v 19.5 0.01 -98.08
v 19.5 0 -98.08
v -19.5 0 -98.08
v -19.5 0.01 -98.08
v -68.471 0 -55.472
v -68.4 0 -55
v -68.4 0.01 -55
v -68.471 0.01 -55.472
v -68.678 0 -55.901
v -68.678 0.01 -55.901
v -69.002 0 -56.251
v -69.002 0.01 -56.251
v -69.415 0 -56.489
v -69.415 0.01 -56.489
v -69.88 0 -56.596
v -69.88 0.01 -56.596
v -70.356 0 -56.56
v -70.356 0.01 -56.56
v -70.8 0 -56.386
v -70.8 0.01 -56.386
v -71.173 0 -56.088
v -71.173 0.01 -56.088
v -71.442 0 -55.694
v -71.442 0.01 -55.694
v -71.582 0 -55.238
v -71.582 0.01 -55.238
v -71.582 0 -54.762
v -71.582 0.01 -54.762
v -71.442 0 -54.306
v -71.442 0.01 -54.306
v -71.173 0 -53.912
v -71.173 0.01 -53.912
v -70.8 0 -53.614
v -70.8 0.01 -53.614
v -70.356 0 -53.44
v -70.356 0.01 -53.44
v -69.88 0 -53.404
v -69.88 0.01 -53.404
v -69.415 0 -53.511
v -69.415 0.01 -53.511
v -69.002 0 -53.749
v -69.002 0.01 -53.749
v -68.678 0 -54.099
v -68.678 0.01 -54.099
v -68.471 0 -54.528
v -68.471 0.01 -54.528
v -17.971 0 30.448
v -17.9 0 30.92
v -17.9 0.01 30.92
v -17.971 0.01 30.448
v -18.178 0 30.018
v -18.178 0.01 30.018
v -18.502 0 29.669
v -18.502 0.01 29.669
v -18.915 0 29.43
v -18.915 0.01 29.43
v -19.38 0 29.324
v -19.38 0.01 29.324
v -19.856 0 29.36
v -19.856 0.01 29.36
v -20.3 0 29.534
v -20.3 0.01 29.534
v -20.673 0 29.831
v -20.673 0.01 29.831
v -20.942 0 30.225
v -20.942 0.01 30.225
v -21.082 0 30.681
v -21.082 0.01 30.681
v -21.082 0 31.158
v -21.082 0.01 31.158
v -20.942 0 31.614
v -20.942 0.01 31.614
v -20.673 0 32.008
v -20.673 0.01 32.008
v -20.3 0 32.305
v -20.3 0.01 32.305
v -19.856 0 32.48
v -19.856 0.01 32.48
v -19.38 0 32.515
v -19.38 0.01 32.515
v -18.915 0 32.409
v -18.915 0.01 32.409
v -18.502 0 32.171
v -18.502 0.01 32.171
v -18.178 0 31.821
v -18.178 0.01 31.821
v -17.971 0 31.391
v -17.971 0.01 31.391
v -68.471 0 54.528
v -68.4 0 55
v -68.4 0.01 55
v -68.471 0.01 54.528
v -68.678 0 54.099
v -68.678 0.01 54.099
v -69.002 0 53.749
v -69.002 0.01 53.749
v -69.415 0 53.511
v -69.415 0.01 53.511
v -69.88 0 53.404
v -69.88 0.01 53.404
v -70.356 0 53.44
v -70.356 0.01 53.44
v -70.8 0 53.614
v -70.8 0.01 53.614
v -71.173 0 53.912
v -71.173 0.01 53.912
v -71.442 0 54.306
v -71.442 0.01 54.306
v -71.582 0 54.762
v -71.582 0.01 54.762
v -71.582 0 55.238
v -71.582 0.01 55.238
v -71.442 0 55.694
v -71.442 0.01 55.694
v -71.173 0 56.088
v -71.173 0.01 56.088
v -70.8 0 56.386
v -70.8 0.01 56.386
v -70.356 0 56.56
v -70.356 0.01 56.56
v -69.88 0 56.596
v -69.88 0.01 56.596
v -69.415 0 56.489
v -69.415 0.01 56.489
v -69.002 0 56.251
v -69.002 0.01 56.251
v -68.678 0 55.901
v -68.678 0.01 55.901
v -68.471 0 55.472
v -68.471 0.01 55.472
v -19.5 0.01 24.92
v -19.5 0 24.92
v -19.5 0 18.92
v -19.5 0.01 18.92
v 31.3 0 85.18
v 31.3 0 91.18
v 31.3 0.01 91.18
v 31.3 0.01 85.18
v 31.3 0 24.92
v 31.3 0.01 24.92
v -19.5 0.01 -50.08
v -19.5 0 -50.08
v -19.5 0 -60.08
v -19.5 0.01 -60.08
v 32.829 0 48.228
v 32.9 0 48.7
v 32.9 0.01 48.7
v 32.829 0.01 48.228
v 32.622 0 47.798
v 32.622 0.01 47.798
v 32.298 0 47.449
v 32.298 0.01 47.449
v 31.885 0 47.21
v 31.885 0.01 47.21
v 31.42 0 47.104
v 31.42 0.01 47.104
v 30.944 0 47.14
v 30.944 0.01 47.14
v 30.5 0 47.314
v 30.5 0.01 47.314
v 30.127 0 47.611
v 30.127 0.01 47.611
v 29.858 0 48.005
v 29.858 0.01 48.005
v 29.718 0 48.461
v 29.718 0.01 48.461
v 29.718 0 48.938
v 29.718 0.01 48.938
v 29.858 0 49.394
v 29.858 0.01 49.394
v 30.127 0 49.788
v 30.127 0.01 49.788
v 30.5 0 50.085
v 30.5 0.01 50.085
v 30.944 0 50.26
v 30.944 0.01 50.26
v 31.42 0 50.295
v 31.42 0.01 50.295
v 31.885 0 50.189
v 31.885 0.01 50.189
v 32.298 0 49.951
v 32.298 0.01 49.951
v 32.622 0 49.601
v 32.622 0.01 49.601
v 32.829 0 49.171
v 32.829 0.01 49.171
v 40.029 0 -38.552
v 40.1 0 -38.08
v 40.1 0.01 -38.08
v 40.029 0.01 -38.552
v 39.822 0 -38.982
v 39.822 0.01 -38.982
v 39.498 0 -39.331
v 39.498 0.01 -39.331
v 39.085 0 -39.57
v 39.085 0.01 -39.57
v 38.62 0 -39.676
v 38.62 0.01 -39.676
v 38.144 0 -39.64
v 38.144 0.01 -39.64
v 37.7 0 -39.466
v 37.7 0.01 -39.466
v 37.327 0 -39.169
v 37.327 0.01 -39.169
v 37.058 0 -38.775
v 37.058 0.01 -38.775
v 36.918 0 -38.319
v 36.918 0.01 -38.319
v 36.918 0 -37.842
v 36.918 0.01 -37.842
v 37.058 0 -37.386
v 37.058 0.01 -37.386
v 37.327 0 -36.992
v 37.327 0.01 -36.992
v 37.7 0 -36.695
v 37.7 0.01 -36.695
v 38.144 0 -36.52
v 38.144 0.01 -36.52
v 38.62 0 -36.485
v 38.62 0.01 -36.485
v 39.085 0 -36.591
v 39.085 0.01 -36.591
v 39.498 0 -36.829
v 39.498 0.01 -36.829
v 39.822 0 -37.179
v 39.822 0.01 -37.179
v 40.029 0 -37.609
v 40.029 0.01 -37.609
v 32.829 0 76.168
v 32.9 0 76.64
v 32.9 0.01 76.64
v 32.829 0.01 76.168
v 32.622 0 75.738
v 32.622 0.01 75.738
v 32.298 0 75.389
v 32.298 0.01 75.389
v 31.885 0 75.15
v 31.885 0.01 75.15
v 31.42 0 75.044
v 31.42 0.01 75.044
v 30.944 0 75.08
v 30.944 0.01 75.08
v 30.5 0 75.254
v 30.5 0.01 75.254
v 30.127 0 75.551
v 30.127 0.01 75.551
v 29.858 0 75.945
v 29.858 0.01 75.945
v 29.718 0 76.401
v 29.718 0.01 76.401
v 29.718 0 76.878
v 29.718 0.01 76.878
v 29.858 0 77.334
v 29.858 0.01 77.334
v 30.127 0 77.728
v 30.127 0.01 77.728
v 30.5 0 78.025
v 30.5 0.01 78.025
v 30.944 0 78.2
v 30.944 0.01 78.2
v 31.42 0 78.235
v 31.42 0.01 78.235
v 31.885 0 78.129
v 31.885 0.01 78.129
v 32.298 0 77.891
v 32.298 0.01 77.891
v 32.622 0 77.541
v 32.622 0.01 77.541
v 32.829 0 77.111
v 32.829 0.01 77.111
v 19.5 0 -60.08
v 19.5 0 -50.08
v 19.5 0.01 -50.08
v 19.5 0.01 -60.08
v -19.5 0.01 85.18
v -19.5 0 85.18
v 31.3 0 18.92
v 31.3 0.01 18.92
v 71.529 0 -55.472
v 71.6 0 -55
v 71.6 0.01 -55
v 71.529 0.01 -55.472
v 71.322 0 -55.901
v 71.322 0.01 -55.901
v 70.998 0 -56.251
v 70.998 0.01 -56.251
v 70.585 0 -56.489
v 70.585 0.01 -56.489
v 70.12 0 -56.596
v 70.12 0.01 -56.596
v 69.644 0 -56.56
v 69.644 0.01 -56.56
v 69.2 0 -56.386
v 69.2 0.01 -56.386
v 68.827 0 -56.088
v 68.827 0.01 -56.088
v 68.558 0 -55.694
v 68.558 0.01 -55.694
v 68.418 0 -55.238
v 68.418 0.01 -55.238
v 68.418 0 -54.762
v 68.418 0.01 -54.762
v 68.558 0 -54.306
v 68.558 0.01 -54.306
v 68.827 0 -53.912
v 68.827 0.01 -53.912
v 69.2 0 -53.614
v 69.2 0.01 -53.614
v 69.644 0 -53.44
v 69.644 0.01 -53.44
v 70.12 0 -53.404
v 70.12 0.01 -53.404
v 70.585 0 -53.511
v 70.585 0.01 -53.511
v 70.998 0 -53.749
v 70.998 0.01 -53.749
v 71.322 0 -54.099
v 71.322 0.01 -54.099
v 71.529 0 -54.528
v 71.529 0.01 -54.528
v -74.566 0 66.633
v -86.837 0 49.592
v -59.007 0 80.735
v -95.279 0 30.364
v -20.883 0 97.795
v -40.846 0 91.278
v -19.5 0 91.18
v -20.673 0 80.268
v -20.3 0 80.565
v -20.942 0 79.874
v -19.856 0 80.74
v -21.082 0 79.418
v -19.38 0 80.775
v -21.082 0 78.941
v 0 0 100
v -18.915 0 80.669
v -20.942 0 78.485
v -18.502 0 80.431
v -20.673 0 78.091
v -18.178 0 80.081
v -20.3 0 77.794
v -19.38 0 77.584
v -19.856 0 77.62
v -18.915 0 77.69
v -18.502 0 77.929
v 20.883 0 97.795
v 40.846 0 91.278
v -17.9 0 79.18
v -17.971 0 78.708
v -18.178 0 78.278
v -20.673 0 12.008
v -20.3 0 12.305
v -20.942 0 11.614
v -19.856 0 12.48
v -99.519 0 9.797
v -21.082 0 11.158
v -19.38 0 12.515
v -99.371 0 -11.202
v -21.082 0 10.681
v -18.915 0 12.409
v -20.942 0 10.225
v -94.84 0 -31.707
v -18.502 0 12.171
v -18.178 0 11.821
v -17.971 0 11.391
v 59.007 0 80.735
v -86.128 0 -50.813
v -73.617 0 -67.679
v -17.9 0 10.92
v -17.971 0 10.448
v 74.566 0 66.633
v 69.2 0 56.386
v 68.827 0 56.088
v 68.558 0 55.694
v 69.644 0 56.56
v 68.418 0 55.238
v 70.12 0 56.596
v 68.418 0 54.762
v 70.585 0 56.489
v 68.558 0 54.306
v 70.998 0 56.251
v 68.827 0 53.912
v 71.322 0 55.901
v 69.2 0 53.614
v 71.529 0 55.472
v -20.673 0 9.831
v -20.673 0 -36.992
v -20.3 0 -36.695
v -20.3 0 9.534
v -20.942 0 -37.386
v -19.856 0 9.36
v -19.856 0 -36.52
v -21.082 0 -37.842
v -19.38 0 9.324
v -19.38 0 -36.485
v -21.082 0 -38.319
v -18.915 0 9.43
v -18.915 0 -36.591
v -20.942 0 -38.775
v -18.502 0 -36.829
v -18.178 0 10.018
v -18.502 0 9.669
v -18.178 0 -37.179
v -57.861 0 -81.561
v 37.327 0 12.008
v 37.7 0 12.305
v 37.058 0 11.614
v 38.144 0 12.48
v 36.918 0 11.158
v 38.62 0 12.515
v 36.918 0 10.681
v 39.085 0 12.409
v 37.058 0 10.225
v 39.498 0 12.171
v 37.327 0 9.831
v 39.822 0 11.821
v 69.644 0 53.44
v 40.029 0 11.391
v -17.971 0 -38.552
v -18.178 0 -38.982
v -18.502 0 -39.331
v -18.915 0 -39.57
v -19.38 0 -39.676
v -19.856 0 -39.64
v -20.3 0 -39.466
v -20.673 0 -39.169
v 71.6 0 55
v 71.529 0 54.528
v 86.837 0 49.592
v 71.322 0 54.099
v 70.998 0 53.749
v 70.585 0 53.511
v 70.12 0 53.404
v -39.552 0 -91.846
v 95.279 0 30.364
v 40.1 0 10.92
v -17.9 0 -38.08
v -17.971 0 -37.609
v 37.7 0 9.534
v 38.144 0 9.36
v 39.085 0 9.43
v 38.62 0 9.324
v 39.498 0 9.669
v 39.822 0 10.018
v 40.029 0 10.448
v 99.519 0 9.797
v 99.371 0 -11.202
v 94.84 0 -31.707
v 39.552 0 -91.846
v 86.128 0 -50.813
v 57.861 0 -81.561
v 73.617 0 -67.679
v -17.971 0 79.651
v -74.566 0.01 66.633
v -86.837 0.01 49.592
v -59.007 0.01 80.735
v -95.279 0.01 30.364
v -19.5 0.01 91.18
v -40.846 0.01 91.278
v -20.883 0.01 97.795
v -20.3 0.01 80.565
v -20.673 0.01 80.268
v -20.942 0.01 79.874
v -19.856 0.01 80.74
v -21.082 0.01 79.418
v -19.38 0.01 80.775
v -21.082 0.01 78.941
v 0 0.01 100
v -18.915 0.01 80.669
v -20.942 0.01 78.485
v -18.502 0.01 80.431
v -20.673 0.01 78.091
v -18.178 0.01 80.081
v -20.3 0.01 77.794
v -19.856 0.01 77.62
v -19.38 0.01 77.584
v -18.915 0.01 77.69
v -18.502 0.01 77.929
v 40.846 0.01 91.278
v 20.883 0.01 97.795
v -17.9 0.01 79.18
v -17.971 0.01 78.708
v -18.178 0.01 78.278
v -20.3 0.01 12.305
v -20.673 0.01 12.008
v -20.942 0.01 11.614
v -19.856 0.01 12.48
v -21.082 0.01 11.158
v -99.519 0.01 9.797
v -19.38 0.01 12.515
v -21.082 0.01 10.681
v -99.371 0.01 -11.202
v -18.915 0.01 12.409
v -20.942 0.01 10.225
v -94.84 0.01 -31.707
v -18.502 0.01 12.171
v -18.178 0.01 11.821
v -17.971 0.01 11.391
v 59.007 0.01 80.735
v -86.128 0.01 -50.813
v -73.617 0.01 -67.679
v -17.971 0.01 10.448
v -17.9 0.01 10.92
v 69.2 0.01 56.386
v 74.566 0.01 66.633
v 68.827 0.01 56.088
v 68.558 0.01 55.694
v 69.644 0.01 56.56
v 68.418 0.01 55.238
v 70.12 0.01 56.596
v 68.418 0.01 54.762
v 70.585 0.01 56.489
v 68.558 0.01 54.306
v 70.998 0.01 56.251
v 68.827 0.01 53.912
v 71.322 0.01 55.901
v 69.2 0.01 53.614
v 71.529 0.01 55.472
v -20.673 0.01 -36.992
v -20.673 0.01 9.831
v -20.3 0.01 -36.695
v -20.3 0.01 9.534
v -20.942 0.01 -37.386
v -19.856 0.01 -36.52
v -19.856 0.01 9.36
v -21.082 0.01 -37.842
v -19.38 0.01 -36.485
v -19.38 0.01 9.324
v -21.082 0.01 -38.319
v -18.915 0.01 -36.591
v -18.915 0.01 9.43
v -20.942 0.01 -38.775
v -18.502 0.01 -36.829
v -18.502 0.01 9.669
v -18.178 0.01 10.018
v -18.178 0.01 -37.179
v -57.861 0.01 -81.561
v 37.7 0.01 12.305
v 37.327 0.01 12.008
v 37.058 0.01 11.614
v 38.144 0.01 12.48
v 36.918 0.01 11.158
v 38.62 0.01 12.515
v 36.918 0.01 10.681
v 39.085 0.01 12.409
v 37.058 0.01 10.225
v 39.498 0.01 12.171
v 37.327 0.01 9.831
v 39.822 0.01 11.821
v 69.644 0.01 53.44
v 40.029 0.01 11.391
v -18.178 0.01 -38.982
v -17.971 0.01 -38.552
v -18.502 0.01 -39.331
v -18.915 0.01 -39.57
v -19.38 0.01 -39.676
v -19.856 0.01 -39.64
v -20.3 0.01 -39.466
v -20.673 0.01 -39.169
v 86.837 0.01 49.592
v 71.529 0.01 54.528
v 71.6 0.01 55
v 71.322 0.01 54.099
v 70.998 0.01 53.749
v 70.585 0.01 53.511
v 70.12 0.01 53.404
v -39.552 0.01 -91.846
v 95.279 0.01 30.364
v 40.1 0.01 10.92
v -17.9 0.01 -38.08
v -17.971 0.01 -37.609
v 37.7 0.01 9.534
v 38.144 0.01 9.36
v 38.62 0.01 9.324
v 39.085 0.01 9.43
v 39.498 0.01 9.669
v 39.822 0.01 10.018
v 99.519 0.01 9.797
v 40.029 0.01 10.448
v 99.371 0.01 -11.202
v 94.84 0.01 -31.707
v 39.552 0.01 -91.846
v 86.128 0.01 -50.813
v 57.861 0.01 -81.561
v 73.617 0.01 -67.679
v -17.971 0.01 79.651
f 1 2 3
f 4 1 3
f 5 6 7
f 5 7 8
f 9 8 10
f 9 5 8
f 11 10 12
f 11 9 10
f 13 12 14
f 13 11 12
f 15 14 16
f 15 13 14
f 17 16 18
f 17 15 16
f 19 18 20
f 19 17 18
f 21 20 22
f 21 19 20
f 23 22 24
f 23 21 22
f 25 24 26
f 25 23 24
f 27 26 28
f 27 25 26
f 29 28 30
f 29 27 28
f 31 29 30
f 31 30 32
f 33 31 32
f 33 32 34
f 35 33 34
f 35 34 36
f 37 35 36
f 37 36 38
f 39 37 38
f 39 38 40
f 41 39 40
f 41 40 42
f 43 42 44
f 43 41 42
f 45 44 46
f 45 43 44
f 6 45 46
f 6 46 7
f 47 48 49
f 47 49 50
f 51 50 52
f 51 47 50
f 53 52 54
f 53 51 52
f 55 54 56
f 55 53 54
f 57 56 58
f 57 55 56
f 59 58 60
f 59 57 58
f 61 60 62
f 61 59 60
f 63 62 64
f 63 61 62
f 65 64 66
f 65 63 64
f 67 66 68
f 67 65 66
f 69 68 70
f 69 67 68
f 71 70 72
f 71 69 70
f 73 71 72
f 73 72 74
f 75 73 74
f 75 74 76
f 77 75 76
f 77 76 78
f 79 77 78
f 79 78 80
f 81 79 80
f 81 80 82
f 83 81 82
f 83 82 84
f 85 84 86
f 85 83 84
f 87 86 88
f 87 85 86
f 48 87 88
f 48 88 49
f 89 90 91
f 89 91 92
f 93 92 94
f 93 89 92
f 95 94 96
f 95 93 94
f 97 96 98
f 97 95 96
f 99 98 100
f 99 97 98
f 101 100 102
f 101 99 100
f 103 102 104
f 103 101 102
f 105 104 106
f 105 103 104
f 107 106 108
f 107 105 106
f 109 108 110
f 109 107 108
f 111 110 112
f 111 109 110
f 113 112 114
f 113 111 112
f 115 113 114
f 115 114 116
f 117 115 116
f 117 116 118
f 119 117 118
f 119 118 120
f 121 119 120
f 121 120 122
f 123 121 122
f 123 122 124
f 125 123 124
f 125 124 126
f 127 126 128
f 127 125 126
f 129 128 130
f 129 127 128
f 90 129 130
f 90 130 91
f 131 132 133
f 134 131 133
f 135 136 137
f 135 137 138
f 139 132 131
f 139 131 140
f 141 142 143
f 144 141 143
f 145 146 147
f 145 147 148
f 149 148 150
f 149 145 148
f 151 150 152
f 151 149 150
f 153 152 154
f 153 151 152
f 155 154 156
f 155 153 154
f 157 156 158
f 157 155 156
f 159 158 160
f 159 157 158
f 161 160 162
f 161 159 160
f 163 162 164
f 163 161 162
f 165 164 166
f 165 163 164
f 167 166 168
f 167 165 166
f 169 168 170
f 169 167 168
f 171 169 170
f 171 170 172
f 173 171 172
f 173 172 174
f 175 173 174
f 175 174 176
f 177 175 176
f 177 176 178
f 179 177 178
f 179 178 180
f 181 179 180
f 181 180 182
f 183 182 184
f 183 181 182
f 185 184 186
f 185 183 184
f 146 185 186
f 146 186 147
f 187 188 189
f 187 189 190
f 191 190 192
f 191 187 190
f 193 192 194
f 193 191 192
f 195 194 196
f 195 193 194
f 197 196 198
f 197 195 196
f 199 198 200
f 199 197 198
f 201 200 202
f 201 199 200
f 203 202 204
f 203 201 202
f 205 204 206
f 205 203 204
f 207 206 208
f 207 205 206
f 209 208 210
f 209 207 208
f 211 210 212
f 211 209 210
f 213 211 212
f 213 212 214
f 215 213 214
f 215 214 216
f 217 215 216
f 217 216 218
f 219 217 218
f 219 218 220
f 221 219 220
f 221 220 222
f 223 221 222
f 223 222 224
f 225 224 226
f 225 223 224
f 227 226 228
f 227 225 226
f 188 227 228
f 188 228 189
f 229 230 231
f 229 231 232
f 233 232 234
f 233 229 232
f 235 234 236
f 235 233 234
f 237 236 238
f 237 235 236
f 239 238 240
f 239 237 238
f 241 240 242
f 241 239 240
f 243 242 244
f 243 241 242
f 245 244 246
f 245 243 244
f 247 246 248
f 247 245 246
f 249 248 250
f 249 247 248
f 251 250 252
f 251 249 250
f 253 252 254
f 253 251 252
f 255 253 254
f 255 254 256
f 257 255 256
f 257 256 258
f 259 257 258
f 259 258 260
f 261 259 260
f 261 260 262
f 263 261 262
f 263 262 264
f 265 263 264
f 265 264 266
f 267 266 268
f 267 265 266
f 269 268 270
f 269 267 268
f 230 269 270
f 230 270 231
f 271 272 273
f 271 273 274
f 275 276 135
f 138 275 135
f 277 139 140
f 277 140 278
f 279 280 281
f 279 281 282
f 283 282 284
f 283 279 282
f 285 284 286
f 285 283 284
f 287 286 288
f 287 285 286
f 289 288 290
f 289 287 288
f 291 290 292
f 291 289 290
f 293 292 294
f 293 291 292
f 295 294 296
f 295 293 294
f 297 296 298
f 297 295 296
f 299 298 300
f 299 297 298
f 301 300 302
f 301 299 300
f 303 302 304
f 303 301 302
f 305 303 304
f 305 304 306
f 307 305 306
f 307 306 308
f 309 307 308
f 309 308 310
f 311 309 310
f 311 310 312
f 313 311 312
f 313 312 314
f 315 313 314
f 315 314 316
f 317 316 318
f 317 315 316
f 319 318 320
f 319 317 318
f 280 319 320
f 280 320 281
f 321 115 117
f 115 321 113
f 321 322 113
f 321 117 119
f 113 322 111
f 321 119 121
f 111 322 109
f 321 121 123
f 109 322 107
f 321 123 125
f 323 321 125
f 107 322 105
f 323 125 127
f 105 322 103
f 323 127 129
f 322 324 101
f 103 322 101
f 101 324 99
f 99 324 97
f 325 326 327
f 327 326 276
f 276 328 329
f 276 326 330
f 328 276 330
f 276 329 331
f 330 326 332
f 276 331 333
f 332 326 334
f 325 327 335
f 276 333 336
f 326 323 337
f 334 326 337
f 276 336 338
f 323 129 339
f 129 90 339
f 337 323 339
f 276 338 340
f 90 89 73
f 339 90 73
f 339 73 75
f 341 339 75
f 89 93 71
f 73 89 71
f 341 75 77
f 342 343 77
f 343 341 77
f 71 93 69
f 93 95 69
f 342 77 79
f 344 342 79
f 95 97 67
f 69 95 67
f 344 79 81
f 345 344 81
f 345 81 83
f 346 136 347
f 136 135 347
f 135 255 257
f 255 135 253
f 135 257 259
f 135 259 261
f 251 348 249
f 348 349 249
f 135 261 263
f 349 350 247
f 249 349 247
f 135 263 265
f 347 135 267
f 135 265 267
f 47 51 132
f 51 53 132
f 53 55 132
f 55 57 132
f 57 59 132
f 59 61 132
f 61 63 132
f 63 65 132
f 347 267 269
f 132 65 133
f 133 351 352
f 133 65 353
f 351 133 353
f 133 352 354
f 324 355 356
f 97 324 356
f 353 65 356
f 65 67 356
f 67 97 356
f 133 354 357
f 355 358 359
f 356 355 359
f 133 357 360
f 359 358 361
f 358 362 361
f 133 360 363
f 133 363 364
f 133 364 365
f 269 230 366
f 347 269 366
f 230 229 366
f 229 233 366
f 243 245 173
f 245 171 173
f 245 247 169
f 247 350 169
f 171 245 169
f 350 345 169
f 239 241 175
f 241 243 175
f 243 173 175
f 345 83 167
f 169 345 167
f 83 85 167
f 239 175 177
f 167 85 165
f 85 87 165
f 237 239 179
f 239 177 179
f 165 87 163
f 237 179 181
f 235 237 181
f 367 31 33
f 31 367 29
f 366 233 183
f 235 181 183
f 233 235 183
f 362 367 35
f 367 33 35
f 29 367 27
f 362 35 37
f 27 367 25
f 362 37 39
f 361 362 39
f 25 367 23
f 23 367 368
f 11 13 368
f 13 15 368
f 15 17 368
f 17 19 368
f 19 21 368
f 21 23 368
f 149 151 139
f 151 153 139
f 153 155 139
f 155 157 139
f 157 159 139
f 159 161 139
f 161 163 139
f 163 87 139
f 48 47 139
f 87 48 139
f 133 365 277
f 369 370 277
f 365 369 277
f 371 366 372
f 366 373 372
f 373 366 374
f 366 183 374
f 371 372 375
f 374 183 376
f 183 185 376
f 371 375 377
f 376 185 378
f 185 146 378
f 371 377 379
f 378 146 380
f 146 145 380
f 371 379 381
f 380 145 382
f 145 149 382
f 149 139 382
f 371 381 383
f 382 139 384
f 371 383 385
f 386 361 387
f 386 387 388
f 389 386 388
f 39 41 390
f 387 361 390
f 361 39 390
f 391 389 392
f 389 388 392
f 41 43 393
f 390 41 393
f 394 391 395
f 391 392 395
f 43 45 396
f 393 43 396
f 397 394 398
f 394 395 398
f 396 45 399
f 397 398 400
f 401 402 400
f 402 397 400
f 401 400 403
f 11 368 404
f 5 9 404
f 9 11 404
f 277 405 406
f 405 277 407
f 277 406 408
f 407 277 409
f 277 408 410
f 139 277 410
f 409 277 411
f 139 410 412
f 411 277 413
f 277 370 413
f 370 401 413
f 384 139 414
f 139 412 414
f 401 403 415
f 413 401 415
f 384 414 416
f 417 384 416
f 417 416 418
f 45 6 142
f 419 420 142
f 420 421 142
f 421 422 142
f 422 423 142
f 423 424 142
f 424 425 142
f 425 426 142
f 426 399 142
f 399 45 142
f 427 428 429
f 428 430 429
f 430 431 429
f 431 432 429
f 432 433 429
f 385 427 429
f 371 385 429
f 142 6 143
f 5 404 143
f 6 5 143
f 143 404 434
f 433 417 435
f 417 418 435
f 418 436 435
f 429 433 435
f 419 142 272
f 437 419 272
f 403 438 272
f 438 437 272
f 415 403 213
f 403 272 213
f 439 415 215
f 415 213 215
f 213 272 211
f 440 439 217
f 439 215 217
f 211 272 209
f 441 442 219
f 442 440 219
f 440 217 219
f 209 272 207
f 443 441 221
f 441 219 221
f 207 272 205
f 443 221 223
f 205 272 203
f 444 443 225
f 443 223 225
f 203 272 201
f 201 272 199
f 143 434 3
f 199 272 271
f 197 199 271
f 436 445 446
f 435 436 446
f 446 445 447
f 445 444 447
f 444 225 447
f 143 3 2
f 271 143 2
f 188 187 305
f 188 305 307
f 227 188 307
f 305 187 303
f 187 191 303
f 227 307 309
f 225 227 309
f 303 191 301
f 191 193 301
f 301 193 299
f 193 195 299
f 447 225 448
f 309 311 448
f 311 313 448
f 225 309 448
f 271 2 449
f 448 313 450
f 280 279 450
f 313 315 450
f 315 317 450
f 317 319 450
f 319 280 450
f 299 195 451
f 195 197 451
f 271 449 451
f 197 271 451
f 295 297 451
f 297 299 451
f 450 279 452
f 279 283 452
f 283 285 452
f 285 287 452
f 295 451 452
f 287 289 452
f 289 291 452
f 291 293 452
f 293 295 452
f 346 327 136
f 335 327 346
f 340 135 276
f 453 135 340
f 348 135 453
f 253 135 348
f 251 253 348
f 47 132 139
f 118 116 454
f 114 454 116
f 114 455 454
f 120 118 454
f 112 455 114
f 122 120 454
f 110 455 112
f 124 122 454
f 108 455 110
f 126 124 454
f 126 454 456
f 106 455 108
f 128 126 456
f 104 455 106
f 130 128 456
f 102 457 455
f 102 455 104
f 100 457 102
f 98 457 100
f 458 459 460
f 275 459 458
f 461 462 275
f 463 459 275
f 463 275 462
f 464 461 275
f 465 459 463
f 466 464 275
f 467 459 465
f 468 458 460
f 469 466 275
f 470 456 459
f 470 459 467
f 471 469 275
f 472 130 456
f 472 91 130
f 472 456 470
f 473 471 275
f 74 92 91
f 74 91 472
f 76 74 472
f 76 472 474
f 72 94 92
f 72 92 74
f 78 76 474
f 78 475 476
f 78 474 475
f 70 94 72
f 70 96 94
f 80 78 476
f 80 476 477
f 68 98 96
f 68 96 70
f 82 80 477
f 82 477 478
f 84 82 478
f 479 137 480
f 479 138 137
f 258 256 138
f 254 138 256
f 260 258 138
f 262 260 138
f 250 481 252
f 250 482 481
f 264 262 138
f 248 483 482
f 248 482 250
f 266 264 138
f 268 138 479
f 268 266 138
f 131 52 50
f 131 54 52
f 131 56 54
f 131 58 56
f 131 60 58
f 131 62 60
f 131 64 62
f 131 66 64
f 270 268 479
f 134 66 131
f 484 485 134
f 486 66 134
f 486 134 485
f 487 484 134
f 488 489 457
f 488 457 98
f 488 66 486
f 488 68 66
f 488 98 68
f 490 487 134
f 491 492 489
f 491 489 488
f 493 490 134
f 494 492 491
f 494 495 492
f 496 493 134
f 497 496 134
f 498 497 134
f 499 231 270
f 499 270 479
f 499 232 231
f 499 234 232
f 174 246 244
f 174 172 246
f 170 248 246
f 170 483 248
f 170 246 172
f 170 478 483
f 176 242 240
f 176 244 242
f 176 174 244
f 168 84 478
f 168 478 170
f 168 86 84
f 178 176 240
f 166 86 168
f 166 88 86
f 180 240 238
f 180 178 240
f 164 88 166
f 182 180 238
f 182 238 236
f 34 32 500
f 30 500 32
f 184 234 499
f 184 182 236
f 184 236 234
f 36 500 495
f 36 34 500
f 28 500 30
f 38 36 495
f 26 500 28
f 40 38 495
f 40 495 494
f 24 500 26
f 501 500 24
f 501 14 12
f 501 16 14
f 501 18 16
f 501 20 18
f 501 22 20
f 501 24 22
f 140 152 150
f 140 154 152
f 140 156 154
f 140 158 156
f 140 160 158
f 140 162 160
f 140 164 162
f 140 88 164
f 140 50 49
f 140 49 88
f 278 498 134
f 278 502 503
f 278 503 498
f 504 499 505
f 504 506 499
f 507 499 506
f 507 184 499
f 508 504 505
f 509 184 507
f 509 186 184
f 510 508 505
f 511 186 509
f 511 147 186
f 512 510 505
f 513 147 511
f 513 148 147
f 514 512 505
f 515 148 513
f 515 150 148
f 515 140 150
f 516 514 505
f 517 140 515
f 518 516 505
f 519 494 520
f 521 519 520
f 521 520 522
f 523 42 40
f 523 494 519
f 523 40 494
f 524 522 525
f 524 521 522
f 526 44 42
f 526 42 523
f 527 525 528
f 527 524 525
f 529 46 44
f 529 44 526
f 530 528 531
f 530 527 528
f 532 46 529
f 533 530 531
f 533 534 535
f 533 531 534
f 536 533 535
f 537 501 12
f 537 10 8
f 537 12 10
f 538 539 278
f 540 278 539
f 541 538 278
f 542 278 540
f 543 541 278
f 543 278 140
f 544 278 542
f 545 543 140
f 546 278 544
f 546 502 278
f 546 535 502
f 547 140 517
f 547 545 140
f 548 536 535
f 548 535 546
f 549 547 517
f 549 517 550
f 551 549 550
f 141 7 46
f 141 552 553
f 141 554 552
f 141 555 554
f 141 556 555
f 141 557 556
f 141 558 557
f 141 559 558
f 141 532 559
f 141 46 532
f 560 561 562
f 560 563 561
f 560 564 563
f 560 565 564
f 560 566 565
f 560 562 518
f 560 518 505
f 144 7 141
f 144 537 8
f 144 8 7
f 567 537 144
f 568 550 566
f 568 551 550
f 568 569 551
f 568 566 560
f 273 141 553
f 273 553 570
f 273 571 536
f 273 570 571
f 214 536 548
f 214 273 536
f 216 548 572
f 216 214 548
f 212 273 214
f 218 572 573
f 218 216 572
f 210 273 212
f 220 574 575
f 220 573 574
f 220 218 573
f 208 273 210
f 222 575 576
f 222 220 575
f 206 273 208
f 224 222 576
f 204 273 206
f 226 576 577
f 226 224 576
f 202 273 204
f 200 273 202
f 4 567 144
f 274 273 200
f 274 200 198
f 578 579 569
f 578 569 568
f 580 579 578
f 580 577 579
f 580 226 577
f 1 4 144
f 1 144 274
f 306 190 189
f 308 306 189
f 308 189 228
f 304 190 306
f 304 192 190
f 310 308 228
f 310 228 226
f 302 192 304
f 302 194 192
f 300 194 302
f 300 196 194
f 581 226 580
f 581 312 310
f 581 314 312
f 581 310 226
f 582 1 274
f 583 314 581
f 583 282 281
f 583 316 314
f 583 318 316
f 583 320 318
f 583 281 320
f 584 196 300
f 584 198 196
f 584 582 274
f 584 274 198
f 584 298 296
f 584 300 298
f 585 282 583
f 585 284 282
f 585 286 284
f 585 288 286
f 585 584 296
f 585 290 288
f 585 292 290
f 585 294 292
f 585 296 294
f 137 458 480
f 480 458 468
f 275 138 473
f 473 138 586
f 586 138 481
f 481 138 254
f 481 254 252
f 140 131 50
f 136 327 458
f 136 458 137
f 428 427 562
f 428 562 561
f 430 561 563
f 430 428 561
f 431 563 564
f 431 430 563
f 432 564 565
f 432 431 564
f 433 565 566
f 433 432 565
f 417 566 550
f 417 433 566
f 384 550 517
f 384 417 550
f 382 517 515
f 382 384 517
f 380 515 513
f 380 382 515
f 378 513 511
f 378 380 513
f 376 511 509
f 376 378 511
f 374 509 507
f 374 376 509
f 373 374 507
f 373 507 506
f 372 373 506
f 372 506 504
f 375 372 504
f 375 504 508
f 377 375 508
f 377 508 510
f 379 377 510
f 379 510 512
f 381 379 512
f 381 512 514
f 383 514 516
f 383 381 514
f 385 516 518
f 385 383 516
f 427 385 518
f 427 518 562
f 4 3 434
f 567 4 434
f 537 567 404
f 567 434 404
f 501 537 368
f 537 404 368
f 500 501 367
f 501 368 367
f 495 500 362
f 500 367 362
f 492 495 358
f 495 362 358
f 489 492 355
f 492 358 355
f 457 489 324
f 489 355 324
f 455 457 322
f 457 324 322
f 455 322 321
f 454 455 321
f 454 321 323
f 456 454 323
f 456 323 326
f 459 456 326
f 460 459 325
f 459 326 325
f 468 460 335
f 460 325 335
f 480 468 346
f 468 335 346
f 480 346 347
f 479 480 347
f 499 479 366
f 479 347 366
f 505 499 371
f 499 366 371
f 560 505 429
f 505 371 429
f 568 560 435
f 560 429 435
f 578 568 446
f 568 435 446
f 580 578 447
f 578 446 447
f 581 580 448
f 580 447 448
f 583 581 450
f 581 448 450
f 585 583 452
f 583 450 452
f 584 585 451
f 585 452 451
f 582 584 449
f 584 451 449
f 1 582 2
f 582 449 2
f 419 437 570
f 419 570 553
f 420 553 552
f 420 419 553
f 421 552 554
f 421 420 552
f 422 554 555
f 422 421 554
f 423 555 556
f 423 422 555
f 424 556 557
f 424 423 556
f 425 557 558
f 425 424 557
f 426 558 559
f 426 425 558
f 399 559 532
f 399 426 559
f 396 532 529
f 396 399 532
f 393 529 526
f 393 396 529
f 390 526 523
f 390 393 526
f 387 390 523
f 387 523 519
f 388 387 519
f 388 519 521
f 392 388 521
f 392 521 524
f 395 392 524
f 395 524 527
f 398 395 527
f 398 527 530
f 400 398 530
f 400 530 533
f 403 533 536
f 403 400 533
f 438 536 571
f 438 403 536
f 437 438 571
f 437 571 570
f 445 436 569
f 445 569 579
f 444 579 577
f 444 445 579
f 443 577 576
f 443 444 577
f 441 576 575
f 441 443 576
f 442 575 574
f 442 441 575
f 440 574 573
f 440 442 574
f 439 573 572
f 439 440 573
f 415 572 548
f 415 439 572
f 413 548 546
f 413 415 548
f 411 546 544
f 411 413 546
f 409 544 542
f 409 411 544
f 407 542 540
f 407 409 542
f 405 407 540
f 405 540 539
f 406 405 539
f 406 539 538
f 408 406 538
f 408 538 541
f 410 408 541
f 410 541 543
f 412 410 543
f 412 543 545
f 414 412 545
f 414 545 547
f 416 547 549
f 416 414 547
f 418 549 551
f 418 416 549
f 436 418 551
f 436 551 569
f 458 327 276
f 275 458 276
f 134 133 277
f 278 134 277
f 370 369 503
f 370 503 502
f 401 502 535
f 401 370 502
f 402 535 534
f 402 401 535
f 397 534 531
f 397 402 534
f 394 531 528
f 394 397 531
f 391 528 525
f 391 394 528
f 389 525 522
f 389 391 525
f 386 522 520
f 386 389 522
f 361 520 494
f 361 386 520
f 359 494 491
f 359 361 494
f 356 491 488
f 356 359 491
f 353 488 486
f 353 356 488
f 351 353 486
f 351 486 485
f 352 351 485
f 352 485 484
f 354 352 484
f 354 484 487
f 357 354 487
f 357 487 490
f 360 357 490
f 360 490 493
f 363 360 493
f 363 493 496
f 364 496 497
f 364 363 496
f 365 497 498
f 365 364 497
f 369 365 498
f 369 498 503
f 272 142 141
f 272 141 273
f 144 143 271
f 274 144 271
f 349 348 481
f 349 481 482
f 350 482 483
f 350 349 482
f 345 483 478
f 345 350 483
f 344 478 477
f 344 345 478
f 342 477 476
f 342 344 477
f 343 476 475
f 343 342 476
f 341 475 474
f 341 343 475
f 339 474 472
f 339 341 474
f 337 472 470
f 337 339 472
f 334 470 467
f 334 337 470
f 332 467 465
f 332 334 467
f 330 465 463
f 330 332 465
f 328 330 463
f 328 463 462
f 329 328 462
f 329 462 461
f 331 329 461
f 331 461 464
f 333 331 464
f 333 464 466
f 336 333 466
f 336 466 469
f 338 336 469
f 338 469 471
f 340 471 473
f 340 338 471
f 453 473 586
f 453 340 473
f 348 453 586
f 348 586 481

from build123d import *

# Parameters (mm, degrees)
SKETCH_2_R      = 1.6
SKETCH_2_W      = 39
SKETCH_2_H      = 10
SKETCH_2_W_2    = 50.8
SKETCH_2_H_2    = 6
EXTRUDE_1_DEPTH = 0.01


with BuildPart() as part:
    # 草圖2 → 填料-伸長1 (new body)
    with BuildSketch(Plane(origin=(0, 0, 0), x_dir=(1, 0, 0), z_dir=(0, 1, 0))):
        with BuildLine():
            Line((-19.5, 98.080324225), (19.5, 98.080324225))
            ThreePointArc((19.5, 98.080324225), (0, -100), (-19.5, 98.080324225))
        make_face()
        with Locations((-19.5, 38.080324225)):
            Circle(SKETCH_2_R, mode=Mode.SUBTRACT)
        with Locations((-19.5, -10.919675775)):
            Circle(SKETCH_2_R, mode=Mode.SUBTRACT)
        with Locations((38.5, 38.080324225)):
            Circle(SKETCH_2_R, mode=Mode.SUBTRACT)
        with Locations((38.5, -10.919675775)):
            Circle(SKETCH_2_R, mode=Mode.SUBTRACT)
        with Locations((-19.5, -30.919675775)):
            Circle(SKETCH_2_R, mode=Mode.SUBTRACT)
        with Locations((-19.5, -79.179675775)):
            Circle(SKETCH_2_R, mode=Mode.SUBTRACT)
        with Locations((31.3, -48.699675775)):
            Circle(SKETCH_2_R, mode=Mode.SUBTRACT)
        with Locations((31.3, -76.639675775)):
            Circle(SKETCH_2_R, mode=Mode.SUBTRACT)
        with Locations((-70, -55)):
            Circle(SKETCH_2_R, mode=Mode.SUBTRACT)
        with Locations((-70, 55)):
            Circle(SKETCH_2_R, mode=Mode.SUBTRACT)
        with Locations((70, -55)):
            Circle(SKETCH_2_R, mode=Mode.SUBTRACT)
        with Locations((70, 55)):
            Circle(SKETCH_2_R, mode=Mode.SUBTRACT)
        with Locations((0, 55.080324225)):
            Rectangle(SKETCH_2_W, SKETCH_2_H, mode=Mode.SUBTRACT)
        with Locations((5.9, -21.919675775)):
            Rectangle(SKETCH_2_W_2, SKETCH_2_H_2, mode=Mode.SUBTRACT)
        with Locations((5.9, -88.179675775)):
            Rectangle(SKETCH_2_W_2, SKETCH_2_H_2, mode=Mode.SUBTRACT)
    extrude(amount=EXTRUDE_1_DEPTH)


solid = part.part
